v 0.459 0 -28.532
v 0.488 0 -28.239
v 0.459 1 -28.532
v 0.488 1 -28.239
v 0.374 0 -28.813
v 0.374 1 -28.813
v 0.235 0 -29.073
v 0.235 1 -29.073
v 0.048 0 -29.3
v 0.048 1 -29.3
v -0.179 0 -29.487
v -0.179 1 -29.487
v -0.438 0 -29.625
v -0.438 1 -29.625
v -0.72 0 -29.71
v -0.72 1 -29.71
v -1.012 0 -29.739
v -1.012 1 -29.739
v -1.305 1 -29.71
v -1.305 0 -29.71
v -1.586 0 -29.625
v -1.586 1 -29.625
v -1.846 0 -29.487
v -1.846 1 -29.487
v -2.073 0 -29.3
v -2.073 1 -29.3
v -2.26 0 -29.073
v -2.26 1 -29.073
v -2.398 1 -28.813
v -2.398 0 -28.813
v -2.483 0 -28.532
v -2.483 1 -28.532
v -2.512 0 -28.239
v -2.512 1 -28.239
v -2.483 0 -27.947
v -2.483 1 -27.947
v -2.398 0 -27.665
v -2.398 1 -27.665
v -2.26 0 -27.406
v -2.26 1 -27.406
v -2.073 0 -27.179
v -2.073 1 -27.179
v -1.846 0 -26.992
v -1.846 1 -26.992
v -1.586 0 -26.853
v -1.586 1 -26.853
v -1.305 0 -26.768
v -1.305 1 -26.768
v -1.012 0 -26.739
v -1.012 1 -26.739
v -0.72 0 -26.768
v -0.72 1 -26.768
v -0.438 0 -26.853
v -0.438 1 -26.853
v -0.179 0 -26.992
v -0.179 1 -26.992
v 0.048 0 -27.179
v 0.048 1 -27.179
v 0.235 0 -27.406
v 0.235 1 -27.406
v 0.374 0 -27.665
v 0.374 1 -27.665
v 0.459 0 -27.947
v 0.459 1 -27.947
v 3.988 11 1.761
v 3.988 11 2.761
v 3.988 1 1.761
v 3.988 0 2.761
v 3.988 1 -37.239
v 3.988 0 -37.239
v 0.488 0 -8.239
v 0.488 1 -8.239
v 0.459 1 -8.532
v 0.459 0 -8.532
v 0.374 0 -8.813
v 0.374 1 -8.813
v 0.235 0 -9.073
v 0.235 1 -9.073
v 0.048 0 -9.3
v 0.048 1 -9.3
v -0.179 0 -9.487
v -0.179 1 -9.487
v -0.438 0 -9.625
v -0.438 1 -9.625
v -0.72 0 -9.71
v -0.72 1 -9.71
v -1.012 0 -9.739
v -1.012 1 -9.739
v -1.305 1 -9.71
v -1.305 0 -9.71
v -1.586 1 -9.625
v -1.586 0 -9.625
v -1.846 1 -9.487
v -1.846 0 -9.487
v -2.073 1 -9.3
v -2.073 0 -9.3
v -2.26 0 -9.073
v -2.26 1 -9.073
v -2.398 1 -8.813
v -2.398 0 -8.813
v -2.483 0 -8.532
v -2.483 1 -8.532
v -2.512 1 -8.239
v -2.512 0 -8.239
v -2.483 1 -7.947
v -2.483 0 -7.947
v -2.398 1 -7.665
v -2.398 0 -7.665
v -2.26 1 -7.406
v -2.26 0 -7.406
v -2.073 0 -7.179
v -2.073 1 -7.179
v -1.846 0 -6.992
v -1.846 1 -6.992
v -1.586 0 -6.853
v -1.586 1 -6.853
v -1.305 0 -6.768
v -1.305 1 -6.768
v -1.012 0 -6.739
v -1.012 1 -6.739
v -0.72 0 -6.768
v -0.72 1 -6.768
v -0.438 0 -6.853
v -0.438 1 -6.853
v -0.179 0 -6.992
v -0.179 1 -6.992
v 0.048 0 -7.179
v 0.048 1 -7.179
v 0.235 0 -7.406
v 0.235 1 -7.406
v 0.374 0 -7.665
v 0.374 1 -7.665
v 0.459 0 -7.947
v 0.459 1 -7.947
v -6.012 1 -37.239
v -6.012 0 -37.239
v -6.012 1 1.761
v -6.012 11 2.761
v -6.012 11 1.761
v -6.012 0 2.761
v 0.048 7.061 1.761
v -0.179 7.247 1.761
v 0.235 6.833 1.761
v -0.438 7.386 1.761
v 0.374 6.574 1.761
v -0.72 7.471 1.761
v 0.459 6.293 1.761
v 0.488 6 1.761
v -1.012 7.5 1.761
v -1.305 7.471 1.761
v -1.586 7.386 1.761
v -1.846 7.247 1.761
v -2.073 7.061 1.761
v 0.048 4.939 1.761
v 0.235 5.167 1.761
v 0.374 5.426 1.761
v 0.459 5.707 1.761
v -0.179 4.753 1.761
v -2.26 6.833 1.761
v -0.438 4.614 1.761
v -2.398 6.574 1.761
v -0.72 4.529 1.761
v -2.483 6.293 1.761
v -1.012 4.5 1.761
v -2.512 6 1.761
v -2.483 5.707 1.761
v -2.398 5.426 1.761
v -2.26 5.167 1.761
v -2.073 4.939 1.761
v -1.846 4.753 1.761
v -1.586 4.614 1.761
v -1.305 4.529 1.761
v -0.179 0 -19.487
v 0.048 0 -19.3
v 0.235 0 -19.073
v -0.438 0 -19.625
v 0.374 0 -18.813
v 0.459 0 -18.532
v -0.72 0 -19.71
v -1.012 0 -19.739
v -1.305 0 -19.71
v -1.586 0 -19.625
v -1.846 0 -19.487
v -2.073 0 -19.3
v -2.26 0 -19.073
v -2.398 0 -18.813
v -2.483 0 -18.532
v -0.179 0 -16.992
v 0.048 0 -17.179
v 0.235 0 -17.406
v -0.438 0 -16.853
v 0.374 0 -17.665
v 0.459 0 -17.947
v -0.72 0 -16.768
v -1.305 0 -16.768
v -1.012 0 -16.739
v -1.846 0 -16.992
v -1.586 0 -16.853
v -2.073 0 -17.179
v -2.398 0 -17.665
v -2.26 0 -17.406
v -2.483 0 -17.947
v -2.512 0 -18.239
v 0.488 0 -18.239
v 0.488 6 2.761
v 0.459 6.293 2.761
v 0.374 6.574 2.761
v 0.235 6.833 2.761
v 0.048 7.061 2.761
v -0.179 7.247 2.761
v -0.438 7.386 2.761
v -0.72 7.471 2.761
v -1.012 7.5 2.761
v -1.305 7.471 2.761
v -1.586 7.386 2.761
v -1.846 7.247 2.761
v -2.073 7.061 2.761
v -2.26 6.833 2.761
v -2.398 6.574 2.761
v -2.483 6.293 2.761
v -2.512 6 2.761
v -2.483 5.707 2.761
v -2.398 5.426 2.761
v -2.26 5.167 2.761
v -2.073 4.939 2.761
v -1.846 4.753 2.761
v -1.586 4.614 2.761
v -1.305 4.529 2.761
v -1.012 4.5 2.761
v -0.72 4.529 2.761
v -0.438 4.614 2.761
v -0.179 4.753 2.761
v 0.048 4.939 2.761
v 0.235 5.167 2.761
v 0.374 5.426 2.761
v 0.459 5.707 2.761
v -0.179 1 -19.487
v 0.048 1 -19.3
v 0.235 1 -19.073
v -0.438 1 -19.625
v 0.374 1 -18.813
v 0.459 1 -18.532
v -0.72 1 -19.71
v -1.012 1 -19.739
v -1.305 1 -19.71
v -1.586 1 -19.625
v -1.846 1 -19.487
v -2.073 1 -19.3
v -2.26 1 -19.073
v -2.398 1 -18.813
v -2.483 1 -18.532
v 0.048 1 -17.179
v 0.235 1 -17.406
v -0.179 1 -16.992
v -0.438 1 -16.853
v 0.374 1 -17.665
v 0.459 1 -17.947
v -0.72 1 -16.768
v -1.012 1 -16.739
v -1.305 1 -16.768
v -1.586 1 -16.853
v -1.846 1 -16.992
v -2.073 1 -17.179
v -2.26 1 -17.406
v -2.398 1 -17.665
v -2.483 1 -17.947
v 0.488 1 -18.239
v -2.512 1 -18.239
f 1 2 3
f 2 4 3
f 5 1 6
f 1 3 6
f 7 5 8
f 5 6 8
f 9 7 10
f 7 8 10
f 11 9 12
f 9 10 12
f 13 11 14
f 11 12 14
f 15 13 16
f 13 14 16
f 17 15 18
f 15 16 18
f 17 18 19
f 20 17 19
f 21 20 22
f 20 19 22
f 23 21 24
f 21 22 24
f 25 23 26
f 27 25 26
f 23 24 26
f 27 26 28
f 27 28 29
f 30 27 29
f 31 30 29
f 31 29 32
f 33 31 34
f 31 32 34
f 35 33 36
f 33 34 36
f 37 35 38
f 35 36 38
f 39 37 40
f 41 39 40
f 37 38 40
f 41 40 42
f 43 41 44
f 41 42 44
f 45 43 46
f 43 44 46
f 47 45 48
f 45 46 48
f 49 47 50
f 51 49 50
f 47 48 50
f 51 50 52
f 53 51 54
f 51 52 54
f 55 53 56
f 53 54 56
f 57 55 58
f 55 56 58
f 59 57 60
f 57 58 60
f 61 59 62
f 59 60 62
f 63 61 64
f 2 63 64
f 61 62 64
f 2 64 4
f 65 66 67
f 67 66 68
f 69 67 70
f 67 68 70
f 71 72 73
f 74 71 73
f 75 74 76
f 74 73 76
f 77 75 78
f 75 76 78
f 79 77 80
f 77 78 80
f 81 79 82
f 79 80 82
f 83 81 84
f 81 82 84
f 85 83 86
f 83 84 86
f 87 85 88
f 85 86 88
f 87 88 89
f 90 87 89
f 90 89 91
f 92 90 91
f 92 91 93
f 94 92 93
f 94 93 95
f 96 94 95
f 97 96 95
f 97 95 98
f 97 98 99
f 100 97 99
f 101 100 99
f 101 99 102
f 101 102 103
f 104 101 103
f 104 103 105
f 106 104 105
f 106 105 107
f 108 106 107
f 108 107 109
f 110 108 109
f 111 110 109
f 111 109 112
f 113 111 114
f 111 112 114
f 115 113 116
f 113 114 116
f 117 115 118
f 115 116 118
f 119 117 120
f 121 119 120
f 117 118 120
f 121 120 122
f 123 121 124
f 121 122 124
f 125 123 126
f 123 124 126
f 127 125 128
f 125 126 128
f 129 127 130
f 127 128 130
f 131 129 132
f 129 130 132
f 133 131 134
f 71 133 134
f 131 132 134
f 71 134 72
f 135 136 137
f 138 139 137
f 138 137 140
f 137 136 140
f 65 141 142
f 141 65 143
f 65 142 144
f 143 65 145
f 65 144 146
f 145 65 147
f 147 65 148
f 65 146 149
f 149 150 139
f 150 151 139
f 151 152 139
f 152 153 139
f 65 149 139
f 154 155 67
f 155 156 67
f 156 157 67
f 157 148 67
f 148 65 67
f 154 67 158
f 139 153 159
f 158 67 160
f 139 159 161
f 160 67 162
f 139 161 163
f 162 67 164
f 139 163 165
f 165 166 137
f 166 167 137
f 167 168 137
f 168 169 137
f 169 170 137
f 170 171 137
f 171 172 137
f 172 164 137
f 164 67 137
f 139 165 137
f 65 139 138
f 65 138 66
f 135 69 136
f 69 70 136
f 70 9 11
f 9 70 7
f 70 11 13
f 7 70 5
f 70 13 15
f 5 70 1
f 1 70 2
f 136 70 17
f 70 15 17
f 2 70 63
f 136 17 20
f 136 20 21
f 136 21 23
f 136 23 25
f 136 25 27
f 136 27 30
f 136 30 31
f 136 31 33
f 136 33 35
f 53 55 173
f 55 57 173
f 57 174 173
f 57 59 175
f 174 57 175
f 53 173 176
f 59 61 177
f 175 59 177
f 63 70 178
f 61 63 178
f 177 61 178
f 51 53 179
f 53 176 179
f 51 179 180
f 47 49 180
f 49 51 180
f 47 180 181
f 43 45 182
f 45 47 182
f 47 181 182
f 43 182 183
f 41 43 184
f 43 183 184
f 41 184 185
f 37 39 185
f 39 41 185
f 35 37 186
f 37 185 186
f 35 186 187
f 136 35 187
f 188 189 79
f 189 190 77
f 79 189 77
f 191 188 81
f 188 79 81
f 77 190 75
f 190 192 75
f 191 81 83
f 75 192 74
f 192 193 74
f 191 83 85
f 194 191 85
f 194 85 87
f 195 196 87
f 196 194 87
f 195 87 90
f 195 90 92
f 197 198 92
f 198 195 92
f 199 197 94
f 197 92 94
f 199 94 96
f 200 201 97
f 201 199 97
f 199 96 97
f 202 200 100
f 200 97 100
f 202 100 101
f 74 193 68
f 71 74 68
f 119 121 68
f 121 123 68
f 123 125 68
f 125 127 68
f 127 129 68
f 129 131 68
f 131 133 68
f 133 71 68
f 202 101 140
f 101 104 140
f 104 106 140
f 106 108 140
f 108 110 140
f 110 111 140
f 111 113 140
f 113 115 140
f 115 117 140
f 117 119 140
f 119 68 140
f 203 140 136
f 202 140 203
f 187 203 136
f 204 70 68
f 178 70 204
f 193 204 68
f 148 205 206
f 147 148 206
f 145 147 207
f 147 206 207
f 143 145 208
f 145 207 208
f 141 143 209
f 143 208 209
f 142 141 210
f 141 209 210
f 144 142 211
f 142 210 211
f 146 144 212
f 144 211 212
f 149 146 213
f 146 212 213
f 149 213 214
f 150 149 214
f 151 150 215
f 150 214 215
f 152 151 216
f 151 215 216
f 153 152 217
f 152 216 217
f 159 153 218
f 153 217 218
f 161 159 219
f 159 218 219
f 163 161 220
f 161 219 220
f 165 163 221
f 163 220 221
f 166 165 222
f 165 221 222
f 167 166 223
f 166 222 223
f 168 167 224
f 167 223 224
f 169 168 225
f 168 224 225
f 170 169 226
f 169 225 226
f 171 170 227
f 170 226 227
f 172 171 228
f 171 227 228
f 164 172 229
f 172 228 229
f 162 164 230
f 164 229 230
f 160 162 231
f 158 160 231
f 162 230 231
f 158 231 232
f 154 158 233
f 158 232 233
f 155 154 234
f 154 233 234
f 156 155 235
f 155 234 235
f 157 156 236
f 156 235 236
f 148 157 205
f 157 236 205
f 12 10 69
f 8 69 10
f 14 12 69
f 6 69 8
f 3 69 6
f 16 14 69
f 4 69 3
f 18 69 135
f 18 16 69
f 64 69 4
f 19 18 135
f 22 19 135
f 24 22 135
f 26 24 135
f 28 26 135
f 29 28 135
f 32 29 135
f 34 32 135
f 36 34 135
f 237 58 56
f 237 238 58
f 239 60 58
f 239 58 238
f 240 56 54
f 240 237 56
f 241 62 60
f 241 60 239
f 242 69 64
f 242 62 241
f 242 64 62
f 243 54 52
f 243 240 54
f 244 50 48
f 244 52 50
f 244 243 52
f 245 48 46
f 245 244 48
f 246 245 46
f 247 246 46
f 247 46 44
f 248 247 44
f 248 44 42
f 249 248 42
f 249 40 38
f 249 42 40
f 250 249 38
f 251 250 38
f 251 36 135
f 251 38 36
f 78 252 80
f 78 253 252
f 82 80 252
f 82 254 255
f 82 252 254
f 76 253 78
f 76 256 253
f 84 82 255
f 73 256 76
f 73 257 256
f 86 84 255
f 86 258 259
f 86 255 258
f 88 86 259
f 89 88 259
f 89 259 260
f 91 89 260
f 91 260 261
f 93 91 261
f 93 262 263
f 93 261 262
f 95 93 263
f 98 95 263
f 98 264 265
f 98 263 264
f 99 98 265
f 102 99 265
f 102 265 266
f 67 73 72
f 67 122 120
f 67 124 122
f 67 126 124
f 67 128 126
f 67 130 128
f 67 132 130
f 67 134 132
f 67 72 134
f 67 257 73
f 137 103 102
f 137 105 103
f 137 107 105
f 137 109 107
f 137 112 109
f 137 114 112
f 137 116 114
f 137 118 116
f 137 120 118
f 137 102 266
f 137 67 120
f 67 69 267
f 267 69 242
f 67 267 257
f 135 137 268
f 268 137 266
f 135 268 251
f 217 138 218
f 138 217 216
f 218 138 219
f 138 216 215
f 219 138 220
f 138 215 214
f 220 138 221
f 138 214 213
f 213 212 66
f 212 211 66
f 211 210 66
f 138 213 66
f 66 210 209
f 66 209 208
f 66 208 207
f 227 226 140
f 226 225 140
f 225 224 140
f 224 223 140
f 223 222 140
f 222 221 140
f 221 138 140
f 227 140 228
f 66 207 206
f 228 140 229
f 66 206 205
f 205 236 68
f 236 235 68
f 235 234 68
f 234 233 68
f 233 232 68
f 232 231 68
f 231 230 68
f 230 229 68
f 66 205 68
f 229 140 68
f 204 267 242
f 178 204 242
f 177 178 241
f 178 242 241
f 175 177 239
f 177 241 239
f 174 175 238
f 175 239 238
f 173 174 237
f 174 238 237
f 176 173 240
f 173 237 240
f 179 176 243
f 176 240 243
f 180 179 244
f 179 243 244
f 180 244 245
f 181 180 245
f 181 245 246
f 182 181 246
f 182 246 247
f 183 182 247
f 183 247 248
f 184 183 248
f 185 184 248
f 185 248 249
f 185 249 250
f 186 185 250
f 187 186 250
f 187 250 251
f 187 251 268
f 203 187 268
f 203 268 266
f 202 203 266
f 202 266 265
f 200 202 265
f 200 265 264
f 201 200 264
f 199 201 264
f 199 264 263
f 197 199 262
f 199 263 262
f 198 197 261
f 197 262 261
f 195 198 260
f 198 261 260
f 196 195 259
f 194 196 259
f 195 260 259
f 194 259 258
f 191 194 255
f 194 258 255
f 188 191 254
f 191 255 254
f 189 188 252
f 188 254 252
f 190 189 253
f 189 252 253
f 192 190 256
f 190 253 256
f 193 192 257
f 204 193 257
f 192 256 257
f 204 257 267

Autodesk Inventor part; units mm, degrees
ref_plane "YZ Plane" through (0, 0, 0) normal (1, 0, 0) x (0, 1, 0)
ref_plane "XZ Plane" through (0, 0, 0) normal (0, 1, 0) x (-1, 0, 0)
ref_plane "XY Plane" through (0, 0, 0) normal (0, 0, 1) x (1, 0, 0)
sketch "草图1" plane through (0, 0, 0) normal (0, 1, 0) x (-1, 0, 0)
  line L0 (6.0123, 2.7607) -> (-3.9877, 2.7607)
  line L1 (-3.9877, 2.7607) -> (-3.9877, -37.2393)
  line L2 (-3.9877, -37.2393) -> (6.0123, -37.2393)
  line L3 (6.0123, -37.2393) -> (6.0123, 2.7607)
  point P0 (0, 0)
  dimension "d0" = 40
  dimension "d1" = 10
extrude "拉伸1" add sketch "草图1" along normal blind 1
sketch "草图2" plane through (0, 1, 0) normal (0, 1, 0) x (1, 0, 0)
  line L0 (-6.0123, 37.2393) -> (-6.0123, -2.7607) projected
  line L1 (3.9877, -2.7607) -> (3.9877, 37.2393) projected
  line L2 (-6.0123, -2.7607) -> (3.9877, -2.7607)
  line L3 (3.9877, -2.7607) -> (3.9877, -1.7607)
  line L4 (3.9877, -1.7607) -> (-6.0123, -1.7607)
  line L5 (-6.0123, -1.7607) -> (-6.0123, -2.7607)
  point P0 (0, 0)
  point P1 (3.9877, -2.7607)
  dimension "d4" = 1
extrude "拉伸2" add sketch "草图2" along normal blind 10
sketch "草图3" plane through (0, 11, 0) normal (0, 1, 0) x (1, 0, 0)
  line L0 (3.9877, -1.7607) -> (-6.0123, -1.7607) projected
  line L1 (-1.0123, -1.7607) -> (-1.0123, 8.2393)
  circle A0 centre (-1.0123, 8.2393) radius 1.5
  line L2 (-1.0123, 8.2393) -> (-1.0123, 18.2393)
  circle A1 centre (-1.0123, 18.2393) radius 1.5
  line L3 (-1.0123, 18.2393) -> (-1.0123, 28.2393)
  circle A2 centre (-1.0123, 28.2393) radius 1.5
  point P0 (0, 0)
  dimension "d7" = 10
  dimension "d8" = 3
  dimension "d15" = 10
  dimension "d16" = 3
  dimension "d17" = 10
  dimension "d18" = 3
extrude "拉伸3" cut sketch "草图3" against normal blind 100
sketch "草图4" plane through (-6.0123, 0, 2.7607) normal (0, 0, 1) x (1, 0, 0)
  line L0 (0, 11) -> (10, 11) projected
  line L1 (5, 11) -> (5, 6)
  circle A0 centre (5, 6) radius 1.5
  point P0 (6.0123, 0)
  dimension "d11" = 5
  dimension "d12" = 3
extrude "拉伸4" cut sketch "草图4" against normal blind 100
equation "\"折弯半径\" = 厚度"
equation "\"折弯释压宽度\" = 厚度"
equation "\"折弯释压深度\" = 0.5 * 厚度"
equation "\"拐角释压尺寸\" = 4 * 厚度"
equation "\"最小余量\" = 2 * 厚度"
equation "\"过渡半径\" = 折弯半径"
equation "\"Jacobi半径尺寸\" = 折弯半径"
equation "\"间隙大小\" = 厚度"
equation "\"厚度\" = 0.5"
